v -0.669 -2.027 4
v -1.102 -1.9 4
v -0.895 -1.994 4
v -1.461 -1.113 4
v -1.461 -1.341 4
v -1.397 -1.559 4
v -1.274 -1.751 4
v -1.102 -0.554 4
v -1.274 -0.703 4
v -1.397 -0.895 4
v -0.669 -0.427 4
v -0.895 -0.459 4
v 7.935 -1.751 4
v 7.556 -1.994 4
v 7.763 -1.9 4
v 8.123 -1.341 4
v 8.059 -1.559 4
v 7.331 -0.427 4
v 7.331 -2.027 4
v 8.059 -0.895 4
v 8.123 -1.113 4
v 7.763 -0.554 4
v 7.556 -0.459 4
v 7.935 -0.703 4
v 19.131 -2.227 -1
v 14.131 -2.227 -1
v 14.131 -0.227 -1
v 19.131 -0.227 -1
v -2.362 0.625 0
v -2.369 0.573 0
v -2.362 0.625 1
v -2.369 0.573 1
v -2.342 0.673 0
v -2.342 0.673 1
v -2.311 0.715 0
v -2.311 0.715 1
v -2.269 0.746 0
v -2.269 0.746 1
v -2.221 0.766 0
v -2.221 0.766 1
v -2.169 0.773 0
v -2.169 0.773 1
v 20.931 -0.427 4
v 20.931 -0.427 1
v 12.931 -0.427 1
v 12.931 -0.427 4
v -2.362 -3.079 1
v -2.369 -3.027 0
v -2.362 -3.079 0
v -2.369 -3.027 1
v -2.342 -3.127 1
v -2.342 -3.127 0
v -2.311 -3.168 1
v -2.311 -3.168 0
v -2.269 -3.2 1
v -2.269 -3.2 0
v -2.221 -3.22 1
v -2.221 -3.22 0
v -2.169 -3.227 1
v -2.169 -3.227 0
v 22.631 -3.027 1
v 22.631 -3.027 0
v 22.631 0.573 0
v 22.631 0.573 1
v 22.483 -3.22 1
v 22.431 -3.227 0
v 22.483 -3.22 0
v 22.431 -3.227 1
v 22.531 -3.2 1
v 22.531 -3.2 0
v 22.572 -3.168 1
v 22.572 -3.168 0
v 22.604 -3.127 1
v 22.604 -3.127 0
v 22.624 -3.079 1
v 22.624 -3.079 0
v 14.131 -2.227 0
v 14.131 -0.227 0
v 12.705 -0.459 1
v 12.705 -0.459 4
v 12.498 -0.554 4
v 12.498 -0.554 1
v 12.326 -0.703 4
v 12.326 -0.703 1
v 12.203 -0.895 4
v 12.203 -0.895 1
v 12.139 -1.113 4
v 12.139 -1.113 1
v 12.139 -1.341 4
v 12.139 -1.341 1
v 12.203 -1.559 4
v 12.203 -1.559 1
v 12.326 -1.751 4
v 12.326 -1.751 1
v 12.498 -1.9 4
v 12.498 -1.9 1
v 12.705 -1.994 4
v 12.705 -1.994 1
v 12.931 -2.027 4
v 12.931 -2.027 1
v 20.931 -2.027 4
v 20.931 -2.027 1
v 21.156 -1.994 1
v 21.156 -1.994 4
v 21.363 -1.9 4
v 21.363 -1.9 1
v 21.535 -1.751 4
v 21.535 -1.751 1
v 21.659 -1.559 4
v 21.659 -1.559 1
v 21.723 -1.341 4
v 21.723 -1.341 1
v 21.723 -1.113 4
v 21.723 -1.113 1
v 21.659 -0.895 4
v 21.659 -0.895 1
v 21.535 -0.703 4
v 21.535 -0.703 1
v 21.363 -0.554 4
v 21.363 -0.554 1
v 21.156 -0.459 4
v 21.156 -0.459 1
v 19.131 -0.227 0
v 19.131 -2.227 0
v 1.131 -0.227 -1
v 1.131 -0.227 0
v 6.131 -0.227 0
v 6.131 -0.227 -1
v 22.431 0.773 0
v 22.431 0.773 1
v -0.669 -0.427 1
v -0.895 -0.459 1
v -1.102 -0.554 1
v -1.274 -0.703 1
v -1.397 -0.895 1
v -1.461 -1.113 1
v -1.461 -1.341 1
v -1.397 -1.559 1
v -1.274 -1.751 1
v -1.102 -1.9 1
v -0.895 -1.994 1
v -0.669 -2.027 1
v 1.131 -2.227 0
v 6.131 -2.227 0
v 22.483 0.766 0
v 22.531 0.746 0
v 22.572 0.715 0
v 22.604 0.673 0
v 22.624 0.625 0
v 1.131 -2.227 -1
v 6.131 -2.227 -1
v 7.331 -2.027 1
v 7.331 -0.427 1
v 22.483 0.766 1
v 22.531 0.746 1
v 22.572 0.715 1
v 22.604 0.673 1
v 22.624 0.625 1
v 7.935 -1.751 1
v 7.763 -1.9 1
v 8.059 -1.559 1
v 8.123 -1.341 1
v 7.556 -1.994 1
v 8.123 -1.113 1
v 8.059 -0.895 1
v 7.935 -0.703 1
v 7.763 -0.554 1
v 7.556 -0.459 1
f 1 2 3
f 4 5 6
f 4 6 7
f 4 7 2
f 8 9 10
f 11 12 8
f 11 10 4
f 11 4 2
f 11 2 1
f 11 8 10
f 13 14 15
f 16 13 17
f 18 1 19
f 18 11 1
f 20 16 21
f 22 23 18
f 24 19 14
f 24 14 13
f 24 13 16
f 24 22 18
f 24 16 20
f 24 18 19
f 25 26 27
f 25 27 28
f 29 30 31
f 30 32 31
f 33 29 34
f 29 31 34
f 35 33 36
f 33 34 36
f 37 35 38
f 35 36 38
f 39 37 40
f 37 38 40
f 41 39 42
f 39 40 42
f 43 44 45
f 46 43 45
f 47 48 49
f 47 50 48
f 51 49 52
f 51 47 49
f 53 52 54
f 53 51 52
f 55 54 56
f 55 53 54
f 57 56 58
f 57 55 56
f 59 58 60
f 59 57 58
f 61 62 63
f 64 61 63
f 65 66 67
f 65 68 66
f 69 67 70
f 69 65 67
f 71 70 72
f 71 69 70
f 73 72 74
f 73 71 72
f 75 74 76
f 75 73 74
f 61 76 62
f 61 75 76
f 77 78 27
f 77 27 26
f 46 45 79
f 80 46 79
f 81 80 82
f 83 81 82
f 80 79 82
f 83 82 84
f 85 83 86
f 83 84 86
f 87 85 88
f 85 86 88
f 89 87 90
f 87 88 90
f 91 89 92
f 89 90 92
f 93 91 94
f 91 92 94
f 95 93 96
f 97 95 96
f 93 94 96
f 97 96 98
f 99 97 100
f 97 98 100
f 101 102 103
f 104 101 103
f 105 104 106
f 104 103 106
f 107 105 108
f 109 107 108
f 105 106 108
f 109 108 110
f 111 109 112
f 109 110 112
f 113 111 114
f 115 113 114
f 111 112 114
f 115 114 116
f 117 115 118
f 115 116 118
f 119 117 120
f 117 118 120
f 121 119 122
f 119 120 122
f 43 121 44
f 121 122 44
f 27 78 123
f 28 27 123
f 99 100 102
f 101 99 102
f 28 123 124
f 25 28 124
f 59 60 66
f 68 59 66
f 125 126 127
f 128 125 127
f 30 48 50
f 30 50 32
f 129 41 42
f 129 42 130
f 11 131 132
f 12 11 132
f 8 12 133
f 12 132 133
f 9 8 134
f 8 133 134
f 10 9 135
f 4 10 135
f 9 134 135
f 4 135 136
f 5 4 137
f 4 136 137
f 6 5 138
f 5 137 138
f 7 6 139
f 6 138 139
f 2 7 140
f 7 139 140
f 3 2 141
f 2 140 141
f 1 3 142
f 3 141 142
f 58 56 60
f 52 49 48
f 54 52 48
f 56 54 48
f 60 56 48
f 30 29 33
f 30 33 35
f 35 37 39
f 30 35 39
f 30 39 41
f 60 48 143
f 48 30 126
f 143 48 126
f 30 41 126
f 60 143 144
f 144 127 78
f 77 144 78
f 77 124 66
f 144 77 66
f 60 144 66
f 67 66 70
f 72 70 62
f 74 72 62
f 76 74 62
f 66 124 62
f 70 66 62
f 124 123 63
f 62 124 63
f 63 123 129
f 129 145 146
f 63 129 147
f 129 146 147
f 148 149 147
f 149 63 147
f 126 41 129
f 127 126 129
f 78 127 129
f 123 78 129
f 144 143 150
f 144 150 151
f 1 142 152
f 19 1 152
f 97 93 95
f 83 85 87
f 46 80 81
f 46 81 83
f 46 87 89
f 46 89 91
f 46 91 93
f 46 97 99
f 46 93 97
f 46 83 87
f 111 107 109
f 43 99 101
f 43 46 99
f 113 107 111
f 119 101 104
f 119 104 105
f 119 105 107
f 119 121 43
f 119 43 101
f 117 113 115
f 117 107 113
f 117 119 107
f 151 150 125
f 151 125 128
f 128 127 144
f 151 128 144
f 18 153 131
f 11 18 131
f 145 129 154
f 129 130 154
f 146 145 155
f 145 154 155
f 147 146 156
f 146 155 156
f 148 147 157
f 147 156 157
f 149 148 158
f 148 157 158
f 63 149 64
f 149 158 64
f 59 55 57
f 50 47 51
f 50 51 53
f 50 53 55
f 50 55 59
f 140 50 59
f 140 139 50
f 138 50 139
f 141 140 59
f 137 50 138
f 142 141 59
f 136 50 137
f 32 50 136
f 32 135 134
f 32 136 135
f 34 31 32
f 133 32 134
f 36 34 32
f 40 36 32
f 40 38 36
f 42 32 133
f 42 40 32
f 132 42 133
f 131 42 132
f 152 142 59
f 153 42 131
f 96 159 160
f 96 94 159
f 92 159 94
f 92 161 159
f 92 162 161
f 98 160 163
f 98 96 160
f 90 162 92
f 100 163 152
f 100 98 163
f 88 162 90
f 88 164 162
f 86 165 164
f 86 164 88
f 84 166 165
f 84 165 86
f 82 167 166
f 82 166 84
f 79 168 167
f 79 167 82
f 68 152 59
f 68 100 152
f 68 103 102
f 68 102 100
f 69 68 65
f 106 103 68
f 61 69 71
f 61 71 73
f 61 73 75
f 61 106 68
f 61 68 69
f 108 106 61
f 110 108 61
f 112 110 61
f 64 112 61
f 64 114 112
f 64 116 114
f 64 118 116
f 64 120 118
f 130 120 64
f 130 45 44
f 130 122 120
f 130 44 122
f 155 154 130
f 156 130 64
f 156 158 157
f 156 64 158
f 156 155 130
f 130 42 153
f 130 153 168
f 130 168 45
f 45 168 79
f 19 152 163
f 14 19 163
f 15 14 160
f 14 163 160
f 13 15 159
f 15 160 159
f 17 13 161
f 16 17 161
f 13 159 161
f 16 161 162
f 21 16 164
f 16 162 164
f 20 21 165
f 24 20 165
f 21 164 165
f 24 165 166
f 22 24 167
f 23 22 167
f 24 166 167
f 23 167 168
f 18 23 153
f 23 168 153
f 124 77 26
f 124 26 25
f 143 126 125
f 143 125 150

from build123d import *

# Parameters (mm, degrees)
F0_W     = 25
F0_H     = 4
F1_DEPTH = 1
F3_DEPTH = 3
F4_R     = 0.2
F5_W     = 5
F5_H     = 2
F6_DEPTH = 1


with BuildPart() as f1:
    # F0 (on Top) → F1 (new body)
    with BuildSketch(Plane.XY):
        with Locations((10.130869, -1.226871)):
            Rectangle(F0_W, F0_H)
    extrude(amount=F1_DEPTH)

    # F2 (on face) → F3 (join)
    with BuildSketch(Plane.XY.offset(1)):
        with BuildLine():
            ThreePointArc((-0.669131, -0.426871), (-1.469131, -1.226871), (-0.669131, -2.026871))
            Line((-0.669131, -2.026871), (7.330869, -2.026871))
            ThreePointArc((7.330869, -2.026871), (8.130869, -1.226871), (7.330869, -0.426871))
            Line((7.330869, -0.426871), (-0.669131, -0.426871))
        make_face()
        with BuildLine():
            ThreePointArc((12.930869, -0.426871), (12.130869, -1.226871), (12.930869, -2.026871))
            Line((12.930869, -2.026871), (20.930869, -2.026871))
            ThreePointArc((20.930869, -2.026871), (21.730869, -1.226871), (20.930869, -0.426871))
            Line((20.930869, -0.426871), (12.930869, -0.426871))
        make_face()
    extrude(amount=F3_DEPTH)

    # F4
    f4_edges = [f1.edges().sort_by_distance(p)[0] for p in [
        (22.630869, 0.773129, 0.5),
        (22.630869, -3.226871, 0.5),
        (-2.369131, -3.226871, 0.5),
        (-2.369131, 0.773129, 0.5),
    ]]
    fillet(f4_edges, radius=F4_R)

    # F5 (on face) → F6 (join)
    with BuildSketch(Plane(origin=(0, 0, 0), x_dir=(1, 0, 0), z_dir=(0, 0, -1))):
        with Locations((3.630869, 1.226871)):
            Rectangle(F5_W, F5_H)
        with Locations((16.630869, 1.226871)):
            Rectangle(F5_W, F5_H)
    extrude(amount=F6_DEPTH)


solid = f1.part
